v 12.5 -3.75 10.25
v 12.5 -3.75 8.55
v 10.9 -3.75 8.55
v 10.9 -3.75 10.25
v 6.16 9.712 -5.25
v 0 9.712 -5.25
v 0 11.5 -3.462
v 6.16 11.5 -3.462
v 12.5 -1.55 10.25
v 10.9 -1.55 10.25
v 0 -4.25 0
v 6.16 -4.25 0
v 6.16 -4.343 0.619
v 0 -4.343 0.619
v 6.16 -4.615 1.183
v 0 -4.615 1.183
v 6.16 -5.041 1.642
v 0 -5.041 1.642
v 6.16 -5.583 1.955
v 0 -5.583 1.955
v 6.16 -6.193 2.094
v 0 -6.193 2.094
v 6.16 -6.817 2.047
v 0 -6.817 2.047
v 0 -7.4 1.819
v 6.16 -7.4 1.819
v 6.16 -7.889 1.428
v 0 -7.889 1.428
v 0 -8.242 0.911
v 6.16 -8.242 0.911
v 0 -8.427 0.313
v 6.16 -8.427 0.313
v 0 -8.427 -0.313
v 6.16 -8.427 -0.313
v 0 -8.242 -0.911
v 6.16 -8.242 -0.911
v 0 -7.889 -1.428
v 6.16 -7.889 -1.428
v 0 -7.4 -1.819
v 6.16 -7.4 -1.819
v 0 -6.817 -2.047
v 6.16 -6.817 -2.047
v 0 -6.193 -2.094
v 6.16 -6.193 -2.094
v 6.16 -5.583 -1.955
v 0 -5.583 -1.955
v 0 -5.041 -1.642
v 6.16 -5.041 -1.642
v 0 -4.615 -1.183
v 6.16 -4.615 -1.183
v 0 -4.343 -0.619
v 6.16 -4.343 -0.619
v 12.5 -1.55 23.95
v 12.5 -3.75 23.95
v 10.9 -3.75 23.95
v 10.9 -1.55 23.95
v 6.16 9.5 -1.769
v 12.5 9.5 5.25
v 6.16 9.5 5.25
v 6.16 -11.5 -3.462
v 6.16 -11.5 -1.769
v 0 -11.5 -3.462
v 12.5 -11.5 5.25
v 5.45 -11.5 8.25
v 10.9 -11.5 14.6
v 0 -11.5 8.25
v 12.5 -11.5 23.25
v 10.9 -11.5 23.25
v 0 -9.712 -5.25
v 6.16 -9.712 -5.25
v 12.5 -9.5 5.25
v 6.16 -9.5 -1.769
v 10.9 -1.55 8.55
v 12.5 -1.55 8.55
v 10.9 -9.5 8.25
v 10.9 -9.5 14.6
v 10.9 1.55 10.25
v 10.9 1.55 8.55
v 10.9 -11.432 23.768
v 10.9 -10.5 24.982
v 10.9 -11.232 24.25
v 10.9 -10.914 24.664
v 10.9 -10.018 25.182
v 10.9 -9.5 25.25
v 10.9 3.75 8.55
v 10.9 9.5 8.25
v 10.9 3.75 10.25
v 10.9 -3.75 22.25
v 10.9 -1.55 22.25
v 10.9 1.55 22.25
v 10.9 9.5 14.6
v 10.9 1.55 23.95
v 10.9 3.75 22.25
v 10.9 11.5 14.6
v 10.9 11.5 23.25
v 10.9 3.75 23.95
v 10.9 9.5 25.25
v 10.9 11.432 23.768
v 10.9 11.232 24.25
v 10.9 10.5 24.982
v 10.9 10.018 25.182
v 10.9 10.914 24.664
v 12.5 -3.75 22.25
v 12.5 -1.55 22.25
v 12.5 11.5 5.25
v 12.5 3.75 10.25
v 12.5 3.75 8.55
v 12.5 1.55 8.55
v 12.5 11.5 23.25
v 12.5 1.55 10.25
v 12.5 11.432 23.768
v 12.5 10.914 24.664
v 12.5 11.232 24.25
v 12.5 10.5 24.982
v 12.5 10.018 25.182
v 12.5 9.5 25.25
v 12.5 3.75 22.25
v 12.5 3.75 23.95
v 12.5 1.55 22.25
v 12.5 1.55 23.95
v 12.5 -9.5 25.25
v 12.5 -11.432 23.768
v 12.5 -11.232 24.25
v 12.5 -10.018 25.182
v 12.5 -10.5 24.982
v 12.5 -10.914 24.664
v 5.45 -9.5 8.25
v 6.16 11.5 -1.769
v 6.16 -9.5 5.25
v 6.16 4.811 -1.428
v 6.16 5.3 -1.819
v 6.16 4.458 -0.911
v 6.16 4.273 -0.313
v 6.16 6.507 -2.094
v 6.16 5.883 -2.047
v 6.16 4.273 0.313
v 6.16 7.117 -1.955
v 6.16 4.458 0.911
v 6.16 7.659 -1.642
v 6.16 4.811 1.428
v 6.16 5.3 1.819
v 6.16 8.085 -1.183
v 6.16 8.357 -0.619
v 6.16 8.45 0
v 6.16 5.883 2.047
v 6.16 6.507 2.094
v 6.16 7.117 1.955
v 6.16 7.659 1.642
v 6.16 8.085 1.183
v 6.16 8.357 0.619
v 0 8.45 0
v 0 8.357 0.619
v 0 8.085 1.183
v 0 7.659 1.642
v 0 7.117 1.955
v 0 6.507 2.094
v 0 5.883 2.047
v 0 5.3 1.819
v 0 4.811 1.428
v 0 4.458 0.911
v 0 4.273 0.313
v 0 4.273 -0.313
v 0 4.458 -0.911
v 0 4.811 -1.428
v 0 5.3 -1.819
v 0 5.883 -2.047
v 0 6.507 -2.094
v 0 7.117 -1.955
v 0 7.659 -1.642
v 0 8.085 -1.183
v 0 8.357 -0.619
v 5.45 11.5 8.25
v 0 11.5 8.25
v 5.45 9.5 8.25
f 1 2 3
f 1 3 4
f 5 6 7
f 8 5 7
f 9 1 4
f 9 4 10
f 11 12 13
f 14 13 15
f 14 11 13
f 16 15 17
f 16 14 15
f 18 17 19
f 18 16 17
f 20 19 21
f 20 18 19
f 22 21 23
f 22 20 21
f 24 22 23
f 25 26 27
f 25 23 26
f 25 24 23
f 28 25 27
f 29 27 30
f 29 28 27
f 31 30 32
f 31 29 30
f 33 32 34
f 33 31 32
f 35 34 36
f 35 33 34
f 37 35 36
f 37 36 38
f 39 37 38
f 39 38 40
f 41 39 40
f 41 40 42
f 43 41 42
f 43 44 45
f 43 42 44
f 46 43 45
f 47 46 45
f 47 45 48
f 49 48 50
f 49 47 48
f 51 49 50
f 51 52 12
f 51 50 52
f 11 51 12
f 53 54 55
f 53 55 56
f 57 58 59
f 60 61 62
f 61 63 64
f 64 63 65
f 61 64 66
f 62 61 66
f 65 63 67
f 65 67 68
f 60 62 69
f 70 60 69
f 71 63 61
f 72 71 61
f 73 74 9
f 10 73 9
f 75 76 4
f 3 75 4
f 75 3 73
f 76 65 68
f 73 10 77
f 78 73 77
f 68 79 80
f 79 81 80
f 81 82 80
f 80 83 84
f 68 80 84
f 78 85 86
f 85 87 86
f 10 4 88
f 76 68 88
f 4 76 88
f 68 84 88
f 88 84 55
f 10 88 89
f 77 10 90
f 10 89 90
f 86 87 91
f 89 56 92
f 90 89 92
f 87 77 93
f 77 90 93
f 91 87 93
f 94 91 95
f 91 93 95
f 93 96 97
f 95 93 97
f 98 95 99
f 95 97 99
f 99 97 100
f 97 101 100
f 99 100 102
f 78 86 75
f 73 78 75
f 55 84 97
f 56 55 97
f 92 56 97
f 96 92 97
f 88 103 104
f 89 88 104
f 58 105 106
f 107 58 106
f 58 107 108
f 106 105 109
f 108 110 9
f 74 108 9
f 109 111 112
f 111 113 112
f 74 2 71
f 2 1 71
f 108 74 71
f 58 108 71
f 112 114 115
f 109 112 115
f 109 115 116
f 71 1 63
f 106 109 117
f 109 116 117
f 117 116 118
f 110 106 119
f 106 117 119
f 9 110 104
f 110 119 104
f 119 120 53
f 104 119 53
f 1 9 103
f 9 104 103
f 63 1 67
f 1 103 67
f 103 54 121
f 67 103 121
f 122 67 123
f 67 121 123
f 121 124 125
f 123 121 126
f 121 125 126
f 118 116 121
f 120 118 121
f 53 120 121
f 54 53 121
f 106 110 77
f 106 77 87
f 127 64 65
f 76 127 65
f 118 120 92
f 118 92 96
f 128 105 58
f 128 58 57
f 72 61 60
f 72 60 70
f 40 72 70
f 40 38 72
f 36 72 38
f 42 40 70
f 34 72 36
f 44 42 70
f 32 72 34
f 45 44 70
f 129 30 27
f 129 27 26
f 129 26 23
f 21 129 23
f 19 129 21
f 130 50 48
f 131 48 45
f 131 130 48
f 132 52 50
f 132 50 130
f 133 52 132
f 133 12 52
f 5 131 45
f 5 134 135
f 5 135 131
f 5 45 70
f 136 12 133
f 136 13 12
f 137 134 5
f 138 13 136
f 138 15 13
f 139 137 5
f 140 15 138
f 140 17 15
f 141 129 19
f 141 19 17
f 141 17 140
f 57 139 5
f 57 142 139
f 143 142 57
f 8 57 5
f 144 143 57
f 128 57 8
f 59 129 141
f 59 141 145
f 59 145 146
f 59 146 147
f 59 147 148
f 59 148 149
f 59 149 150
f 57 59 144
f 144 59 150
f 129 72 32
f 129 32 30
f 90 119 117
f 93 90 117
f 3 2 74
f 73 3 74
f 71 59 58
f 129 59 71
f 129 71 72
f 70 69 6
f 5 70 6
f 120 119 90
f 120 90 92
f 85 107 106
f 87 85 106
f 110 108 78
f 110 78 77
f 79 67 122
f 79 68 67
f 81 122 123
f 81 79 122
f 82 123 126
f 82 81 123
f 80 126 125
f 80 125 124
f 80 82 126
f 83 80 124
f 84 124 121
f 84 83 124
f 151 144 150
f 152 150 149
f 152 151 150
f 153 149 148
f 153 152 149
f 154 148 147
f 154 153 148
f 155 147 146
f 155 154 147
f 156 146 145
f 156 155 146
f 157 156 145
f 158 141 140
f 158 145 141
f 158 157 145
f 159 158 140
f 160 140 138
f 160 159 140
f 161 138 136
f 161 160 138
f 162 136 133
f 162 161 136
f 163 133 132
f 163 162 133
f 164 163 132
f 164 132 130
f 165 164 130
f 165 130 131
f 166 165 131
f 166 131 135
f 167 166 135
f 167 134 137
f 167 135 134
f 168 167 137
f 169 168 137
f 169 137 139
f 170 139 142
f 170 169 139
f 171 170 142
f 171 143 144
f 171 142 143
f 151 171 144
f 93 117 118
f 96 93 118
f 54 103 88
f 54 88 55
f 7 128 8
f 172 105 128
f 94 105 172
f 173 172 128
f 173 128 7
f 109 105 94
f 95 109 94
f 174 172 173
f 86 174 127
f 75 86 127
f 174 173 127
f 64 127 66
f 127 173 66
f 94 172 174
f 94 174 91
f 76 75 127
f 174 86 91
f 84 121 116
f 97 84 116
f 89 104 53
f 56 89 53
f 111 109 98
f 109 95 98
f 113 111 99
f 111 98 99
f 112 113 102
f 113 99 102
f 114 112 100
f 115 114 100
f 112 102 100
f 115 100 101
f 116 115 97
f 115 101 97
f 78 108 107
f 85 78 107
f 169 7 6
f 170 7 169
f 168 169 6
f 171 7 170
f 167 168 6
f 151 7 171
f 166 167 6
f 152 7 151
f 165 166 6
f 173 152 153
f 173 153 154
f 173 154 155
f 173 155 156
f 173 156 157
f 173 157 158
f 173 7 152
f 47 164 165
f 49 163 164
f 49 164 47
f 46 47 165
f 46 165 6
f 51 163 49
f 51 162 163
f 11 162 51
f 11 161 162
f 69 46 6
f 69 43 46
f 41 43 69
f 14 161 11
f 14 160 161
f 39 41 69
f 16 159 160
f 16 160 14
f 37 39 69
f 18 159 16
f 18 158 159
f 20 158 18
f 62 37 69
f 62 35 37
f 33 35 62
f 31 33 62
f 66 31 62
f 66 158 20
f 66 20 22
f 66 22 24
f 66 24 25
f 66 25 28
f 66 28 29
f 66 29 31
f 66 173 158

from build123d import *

# Parameters (mm, degrees)
F0_R     = 2.1
F1_DEPTH = 6.16
F2_W     = 23
F2_H     = 3
F3_DEPTH = 12.5
F4_W     = 23
F4_H     = 20
F4_W_2   = 2.2
F4_H_2   = 1.7
F5_DEPTH = 1.6
F8_DEPTH = 2
F12_R    = 2


with BuildPart() as f1:
    # F0 (on Right) → F1 (new body)
    with BuildSketch(Plane.YZ):
        Polygon((-9.7124977037, -5.25), (9.7124977037, -5.25), (11.5, -3.4624977037), (11.5, 3.4624977037), (11.5, 5.25), (9.7124977037, 5.25), (-9.7124977037, 5.25), (-11.5, 5.25), (-11.5, 3.4624977037), (-11.5, -3.4624977037), align=None)
        with Locations((-6.35, 0)):
            Circle(F0_R, mode=Mode.SUBTRACT)
        with Locations((6.35, 0)):
            Circle(F0_R, mode=Mode.SUBTRACT)
    extrude(amount=F1_DEPTH)

    # F2 (on face) → F3 (join)
    with BuildSketch(Plane(origin=(0, 0, 0), x_dir=(0, -1, 0), z_dir=(-1, 0, 0))):
        with Locations((0, 6.75)):
            Rectangle(F2_W, F2_H)
    extrude(amount=-F3_DEPTH)

    # F4 (on face) → F5 (join)
    with BuildSketch(Plane.YZ.offset(12.5)):
        with Locations((0, 15.25)):
            Rectangle(F4_W, F4_H)
        with Locations((-2.65, 9.4)):
            Rectangle(F4_W_2, F4_H_2, mode=Mode.SUBTRACT)
        with Locations((2.65, 9.4)):
            Rectangle(F4_W_2, F4_H_2, mode=Mode.SUBTRACT)
        with Locations((-2.65, 23.1)):
            Rectangle(F4_W_2, F4_H_2, mode=Mode.SUBTRACT)
        with Locations((2.65, 23.1)):
            Rectangle(F4_W_2, F4_H_2, mode=Mode.SUBTRACT)
    extrude(amount=-F5_DEPTH)

    # F6: union 

    # F7 (on face) → F8 (join)
    with BuildSketch(Plane(origin=(0, 11.5, 0), x_dir=(-1, 0, 0), z_dir=(0, 1, 0))):
        Polygon((-5.45, 8.25), (-10.9, 14.6002341062), (-10.9, 8.25), align=None)
        Polygon((-6.16, 5.25), (-12.5, 5.25), (-6.16, -1.7691504909), align=None)
    extrude(amount=-F8_DEPTH)

    # F10: F1 across plane


with BuildPart() as f1_1:
    add(f1.part)
    add(f1.part.mirror(Plane.XZ))

    # F11: F1 across plane


with BuildPart() as f1_2:
    add(f1_1.part)
    add(f1_1.part.mirror(Plane.XZ))

    # F12
    f12_edges = [f1_2.edges().sort_by_distance(p)[0] for p in [
        (11.7, 11.5, 25.25),
        (11.7, -11.5, 25.25),
    ]]
    fillet(f12_edges, radius=F12_R)


solid = f1_2.part
